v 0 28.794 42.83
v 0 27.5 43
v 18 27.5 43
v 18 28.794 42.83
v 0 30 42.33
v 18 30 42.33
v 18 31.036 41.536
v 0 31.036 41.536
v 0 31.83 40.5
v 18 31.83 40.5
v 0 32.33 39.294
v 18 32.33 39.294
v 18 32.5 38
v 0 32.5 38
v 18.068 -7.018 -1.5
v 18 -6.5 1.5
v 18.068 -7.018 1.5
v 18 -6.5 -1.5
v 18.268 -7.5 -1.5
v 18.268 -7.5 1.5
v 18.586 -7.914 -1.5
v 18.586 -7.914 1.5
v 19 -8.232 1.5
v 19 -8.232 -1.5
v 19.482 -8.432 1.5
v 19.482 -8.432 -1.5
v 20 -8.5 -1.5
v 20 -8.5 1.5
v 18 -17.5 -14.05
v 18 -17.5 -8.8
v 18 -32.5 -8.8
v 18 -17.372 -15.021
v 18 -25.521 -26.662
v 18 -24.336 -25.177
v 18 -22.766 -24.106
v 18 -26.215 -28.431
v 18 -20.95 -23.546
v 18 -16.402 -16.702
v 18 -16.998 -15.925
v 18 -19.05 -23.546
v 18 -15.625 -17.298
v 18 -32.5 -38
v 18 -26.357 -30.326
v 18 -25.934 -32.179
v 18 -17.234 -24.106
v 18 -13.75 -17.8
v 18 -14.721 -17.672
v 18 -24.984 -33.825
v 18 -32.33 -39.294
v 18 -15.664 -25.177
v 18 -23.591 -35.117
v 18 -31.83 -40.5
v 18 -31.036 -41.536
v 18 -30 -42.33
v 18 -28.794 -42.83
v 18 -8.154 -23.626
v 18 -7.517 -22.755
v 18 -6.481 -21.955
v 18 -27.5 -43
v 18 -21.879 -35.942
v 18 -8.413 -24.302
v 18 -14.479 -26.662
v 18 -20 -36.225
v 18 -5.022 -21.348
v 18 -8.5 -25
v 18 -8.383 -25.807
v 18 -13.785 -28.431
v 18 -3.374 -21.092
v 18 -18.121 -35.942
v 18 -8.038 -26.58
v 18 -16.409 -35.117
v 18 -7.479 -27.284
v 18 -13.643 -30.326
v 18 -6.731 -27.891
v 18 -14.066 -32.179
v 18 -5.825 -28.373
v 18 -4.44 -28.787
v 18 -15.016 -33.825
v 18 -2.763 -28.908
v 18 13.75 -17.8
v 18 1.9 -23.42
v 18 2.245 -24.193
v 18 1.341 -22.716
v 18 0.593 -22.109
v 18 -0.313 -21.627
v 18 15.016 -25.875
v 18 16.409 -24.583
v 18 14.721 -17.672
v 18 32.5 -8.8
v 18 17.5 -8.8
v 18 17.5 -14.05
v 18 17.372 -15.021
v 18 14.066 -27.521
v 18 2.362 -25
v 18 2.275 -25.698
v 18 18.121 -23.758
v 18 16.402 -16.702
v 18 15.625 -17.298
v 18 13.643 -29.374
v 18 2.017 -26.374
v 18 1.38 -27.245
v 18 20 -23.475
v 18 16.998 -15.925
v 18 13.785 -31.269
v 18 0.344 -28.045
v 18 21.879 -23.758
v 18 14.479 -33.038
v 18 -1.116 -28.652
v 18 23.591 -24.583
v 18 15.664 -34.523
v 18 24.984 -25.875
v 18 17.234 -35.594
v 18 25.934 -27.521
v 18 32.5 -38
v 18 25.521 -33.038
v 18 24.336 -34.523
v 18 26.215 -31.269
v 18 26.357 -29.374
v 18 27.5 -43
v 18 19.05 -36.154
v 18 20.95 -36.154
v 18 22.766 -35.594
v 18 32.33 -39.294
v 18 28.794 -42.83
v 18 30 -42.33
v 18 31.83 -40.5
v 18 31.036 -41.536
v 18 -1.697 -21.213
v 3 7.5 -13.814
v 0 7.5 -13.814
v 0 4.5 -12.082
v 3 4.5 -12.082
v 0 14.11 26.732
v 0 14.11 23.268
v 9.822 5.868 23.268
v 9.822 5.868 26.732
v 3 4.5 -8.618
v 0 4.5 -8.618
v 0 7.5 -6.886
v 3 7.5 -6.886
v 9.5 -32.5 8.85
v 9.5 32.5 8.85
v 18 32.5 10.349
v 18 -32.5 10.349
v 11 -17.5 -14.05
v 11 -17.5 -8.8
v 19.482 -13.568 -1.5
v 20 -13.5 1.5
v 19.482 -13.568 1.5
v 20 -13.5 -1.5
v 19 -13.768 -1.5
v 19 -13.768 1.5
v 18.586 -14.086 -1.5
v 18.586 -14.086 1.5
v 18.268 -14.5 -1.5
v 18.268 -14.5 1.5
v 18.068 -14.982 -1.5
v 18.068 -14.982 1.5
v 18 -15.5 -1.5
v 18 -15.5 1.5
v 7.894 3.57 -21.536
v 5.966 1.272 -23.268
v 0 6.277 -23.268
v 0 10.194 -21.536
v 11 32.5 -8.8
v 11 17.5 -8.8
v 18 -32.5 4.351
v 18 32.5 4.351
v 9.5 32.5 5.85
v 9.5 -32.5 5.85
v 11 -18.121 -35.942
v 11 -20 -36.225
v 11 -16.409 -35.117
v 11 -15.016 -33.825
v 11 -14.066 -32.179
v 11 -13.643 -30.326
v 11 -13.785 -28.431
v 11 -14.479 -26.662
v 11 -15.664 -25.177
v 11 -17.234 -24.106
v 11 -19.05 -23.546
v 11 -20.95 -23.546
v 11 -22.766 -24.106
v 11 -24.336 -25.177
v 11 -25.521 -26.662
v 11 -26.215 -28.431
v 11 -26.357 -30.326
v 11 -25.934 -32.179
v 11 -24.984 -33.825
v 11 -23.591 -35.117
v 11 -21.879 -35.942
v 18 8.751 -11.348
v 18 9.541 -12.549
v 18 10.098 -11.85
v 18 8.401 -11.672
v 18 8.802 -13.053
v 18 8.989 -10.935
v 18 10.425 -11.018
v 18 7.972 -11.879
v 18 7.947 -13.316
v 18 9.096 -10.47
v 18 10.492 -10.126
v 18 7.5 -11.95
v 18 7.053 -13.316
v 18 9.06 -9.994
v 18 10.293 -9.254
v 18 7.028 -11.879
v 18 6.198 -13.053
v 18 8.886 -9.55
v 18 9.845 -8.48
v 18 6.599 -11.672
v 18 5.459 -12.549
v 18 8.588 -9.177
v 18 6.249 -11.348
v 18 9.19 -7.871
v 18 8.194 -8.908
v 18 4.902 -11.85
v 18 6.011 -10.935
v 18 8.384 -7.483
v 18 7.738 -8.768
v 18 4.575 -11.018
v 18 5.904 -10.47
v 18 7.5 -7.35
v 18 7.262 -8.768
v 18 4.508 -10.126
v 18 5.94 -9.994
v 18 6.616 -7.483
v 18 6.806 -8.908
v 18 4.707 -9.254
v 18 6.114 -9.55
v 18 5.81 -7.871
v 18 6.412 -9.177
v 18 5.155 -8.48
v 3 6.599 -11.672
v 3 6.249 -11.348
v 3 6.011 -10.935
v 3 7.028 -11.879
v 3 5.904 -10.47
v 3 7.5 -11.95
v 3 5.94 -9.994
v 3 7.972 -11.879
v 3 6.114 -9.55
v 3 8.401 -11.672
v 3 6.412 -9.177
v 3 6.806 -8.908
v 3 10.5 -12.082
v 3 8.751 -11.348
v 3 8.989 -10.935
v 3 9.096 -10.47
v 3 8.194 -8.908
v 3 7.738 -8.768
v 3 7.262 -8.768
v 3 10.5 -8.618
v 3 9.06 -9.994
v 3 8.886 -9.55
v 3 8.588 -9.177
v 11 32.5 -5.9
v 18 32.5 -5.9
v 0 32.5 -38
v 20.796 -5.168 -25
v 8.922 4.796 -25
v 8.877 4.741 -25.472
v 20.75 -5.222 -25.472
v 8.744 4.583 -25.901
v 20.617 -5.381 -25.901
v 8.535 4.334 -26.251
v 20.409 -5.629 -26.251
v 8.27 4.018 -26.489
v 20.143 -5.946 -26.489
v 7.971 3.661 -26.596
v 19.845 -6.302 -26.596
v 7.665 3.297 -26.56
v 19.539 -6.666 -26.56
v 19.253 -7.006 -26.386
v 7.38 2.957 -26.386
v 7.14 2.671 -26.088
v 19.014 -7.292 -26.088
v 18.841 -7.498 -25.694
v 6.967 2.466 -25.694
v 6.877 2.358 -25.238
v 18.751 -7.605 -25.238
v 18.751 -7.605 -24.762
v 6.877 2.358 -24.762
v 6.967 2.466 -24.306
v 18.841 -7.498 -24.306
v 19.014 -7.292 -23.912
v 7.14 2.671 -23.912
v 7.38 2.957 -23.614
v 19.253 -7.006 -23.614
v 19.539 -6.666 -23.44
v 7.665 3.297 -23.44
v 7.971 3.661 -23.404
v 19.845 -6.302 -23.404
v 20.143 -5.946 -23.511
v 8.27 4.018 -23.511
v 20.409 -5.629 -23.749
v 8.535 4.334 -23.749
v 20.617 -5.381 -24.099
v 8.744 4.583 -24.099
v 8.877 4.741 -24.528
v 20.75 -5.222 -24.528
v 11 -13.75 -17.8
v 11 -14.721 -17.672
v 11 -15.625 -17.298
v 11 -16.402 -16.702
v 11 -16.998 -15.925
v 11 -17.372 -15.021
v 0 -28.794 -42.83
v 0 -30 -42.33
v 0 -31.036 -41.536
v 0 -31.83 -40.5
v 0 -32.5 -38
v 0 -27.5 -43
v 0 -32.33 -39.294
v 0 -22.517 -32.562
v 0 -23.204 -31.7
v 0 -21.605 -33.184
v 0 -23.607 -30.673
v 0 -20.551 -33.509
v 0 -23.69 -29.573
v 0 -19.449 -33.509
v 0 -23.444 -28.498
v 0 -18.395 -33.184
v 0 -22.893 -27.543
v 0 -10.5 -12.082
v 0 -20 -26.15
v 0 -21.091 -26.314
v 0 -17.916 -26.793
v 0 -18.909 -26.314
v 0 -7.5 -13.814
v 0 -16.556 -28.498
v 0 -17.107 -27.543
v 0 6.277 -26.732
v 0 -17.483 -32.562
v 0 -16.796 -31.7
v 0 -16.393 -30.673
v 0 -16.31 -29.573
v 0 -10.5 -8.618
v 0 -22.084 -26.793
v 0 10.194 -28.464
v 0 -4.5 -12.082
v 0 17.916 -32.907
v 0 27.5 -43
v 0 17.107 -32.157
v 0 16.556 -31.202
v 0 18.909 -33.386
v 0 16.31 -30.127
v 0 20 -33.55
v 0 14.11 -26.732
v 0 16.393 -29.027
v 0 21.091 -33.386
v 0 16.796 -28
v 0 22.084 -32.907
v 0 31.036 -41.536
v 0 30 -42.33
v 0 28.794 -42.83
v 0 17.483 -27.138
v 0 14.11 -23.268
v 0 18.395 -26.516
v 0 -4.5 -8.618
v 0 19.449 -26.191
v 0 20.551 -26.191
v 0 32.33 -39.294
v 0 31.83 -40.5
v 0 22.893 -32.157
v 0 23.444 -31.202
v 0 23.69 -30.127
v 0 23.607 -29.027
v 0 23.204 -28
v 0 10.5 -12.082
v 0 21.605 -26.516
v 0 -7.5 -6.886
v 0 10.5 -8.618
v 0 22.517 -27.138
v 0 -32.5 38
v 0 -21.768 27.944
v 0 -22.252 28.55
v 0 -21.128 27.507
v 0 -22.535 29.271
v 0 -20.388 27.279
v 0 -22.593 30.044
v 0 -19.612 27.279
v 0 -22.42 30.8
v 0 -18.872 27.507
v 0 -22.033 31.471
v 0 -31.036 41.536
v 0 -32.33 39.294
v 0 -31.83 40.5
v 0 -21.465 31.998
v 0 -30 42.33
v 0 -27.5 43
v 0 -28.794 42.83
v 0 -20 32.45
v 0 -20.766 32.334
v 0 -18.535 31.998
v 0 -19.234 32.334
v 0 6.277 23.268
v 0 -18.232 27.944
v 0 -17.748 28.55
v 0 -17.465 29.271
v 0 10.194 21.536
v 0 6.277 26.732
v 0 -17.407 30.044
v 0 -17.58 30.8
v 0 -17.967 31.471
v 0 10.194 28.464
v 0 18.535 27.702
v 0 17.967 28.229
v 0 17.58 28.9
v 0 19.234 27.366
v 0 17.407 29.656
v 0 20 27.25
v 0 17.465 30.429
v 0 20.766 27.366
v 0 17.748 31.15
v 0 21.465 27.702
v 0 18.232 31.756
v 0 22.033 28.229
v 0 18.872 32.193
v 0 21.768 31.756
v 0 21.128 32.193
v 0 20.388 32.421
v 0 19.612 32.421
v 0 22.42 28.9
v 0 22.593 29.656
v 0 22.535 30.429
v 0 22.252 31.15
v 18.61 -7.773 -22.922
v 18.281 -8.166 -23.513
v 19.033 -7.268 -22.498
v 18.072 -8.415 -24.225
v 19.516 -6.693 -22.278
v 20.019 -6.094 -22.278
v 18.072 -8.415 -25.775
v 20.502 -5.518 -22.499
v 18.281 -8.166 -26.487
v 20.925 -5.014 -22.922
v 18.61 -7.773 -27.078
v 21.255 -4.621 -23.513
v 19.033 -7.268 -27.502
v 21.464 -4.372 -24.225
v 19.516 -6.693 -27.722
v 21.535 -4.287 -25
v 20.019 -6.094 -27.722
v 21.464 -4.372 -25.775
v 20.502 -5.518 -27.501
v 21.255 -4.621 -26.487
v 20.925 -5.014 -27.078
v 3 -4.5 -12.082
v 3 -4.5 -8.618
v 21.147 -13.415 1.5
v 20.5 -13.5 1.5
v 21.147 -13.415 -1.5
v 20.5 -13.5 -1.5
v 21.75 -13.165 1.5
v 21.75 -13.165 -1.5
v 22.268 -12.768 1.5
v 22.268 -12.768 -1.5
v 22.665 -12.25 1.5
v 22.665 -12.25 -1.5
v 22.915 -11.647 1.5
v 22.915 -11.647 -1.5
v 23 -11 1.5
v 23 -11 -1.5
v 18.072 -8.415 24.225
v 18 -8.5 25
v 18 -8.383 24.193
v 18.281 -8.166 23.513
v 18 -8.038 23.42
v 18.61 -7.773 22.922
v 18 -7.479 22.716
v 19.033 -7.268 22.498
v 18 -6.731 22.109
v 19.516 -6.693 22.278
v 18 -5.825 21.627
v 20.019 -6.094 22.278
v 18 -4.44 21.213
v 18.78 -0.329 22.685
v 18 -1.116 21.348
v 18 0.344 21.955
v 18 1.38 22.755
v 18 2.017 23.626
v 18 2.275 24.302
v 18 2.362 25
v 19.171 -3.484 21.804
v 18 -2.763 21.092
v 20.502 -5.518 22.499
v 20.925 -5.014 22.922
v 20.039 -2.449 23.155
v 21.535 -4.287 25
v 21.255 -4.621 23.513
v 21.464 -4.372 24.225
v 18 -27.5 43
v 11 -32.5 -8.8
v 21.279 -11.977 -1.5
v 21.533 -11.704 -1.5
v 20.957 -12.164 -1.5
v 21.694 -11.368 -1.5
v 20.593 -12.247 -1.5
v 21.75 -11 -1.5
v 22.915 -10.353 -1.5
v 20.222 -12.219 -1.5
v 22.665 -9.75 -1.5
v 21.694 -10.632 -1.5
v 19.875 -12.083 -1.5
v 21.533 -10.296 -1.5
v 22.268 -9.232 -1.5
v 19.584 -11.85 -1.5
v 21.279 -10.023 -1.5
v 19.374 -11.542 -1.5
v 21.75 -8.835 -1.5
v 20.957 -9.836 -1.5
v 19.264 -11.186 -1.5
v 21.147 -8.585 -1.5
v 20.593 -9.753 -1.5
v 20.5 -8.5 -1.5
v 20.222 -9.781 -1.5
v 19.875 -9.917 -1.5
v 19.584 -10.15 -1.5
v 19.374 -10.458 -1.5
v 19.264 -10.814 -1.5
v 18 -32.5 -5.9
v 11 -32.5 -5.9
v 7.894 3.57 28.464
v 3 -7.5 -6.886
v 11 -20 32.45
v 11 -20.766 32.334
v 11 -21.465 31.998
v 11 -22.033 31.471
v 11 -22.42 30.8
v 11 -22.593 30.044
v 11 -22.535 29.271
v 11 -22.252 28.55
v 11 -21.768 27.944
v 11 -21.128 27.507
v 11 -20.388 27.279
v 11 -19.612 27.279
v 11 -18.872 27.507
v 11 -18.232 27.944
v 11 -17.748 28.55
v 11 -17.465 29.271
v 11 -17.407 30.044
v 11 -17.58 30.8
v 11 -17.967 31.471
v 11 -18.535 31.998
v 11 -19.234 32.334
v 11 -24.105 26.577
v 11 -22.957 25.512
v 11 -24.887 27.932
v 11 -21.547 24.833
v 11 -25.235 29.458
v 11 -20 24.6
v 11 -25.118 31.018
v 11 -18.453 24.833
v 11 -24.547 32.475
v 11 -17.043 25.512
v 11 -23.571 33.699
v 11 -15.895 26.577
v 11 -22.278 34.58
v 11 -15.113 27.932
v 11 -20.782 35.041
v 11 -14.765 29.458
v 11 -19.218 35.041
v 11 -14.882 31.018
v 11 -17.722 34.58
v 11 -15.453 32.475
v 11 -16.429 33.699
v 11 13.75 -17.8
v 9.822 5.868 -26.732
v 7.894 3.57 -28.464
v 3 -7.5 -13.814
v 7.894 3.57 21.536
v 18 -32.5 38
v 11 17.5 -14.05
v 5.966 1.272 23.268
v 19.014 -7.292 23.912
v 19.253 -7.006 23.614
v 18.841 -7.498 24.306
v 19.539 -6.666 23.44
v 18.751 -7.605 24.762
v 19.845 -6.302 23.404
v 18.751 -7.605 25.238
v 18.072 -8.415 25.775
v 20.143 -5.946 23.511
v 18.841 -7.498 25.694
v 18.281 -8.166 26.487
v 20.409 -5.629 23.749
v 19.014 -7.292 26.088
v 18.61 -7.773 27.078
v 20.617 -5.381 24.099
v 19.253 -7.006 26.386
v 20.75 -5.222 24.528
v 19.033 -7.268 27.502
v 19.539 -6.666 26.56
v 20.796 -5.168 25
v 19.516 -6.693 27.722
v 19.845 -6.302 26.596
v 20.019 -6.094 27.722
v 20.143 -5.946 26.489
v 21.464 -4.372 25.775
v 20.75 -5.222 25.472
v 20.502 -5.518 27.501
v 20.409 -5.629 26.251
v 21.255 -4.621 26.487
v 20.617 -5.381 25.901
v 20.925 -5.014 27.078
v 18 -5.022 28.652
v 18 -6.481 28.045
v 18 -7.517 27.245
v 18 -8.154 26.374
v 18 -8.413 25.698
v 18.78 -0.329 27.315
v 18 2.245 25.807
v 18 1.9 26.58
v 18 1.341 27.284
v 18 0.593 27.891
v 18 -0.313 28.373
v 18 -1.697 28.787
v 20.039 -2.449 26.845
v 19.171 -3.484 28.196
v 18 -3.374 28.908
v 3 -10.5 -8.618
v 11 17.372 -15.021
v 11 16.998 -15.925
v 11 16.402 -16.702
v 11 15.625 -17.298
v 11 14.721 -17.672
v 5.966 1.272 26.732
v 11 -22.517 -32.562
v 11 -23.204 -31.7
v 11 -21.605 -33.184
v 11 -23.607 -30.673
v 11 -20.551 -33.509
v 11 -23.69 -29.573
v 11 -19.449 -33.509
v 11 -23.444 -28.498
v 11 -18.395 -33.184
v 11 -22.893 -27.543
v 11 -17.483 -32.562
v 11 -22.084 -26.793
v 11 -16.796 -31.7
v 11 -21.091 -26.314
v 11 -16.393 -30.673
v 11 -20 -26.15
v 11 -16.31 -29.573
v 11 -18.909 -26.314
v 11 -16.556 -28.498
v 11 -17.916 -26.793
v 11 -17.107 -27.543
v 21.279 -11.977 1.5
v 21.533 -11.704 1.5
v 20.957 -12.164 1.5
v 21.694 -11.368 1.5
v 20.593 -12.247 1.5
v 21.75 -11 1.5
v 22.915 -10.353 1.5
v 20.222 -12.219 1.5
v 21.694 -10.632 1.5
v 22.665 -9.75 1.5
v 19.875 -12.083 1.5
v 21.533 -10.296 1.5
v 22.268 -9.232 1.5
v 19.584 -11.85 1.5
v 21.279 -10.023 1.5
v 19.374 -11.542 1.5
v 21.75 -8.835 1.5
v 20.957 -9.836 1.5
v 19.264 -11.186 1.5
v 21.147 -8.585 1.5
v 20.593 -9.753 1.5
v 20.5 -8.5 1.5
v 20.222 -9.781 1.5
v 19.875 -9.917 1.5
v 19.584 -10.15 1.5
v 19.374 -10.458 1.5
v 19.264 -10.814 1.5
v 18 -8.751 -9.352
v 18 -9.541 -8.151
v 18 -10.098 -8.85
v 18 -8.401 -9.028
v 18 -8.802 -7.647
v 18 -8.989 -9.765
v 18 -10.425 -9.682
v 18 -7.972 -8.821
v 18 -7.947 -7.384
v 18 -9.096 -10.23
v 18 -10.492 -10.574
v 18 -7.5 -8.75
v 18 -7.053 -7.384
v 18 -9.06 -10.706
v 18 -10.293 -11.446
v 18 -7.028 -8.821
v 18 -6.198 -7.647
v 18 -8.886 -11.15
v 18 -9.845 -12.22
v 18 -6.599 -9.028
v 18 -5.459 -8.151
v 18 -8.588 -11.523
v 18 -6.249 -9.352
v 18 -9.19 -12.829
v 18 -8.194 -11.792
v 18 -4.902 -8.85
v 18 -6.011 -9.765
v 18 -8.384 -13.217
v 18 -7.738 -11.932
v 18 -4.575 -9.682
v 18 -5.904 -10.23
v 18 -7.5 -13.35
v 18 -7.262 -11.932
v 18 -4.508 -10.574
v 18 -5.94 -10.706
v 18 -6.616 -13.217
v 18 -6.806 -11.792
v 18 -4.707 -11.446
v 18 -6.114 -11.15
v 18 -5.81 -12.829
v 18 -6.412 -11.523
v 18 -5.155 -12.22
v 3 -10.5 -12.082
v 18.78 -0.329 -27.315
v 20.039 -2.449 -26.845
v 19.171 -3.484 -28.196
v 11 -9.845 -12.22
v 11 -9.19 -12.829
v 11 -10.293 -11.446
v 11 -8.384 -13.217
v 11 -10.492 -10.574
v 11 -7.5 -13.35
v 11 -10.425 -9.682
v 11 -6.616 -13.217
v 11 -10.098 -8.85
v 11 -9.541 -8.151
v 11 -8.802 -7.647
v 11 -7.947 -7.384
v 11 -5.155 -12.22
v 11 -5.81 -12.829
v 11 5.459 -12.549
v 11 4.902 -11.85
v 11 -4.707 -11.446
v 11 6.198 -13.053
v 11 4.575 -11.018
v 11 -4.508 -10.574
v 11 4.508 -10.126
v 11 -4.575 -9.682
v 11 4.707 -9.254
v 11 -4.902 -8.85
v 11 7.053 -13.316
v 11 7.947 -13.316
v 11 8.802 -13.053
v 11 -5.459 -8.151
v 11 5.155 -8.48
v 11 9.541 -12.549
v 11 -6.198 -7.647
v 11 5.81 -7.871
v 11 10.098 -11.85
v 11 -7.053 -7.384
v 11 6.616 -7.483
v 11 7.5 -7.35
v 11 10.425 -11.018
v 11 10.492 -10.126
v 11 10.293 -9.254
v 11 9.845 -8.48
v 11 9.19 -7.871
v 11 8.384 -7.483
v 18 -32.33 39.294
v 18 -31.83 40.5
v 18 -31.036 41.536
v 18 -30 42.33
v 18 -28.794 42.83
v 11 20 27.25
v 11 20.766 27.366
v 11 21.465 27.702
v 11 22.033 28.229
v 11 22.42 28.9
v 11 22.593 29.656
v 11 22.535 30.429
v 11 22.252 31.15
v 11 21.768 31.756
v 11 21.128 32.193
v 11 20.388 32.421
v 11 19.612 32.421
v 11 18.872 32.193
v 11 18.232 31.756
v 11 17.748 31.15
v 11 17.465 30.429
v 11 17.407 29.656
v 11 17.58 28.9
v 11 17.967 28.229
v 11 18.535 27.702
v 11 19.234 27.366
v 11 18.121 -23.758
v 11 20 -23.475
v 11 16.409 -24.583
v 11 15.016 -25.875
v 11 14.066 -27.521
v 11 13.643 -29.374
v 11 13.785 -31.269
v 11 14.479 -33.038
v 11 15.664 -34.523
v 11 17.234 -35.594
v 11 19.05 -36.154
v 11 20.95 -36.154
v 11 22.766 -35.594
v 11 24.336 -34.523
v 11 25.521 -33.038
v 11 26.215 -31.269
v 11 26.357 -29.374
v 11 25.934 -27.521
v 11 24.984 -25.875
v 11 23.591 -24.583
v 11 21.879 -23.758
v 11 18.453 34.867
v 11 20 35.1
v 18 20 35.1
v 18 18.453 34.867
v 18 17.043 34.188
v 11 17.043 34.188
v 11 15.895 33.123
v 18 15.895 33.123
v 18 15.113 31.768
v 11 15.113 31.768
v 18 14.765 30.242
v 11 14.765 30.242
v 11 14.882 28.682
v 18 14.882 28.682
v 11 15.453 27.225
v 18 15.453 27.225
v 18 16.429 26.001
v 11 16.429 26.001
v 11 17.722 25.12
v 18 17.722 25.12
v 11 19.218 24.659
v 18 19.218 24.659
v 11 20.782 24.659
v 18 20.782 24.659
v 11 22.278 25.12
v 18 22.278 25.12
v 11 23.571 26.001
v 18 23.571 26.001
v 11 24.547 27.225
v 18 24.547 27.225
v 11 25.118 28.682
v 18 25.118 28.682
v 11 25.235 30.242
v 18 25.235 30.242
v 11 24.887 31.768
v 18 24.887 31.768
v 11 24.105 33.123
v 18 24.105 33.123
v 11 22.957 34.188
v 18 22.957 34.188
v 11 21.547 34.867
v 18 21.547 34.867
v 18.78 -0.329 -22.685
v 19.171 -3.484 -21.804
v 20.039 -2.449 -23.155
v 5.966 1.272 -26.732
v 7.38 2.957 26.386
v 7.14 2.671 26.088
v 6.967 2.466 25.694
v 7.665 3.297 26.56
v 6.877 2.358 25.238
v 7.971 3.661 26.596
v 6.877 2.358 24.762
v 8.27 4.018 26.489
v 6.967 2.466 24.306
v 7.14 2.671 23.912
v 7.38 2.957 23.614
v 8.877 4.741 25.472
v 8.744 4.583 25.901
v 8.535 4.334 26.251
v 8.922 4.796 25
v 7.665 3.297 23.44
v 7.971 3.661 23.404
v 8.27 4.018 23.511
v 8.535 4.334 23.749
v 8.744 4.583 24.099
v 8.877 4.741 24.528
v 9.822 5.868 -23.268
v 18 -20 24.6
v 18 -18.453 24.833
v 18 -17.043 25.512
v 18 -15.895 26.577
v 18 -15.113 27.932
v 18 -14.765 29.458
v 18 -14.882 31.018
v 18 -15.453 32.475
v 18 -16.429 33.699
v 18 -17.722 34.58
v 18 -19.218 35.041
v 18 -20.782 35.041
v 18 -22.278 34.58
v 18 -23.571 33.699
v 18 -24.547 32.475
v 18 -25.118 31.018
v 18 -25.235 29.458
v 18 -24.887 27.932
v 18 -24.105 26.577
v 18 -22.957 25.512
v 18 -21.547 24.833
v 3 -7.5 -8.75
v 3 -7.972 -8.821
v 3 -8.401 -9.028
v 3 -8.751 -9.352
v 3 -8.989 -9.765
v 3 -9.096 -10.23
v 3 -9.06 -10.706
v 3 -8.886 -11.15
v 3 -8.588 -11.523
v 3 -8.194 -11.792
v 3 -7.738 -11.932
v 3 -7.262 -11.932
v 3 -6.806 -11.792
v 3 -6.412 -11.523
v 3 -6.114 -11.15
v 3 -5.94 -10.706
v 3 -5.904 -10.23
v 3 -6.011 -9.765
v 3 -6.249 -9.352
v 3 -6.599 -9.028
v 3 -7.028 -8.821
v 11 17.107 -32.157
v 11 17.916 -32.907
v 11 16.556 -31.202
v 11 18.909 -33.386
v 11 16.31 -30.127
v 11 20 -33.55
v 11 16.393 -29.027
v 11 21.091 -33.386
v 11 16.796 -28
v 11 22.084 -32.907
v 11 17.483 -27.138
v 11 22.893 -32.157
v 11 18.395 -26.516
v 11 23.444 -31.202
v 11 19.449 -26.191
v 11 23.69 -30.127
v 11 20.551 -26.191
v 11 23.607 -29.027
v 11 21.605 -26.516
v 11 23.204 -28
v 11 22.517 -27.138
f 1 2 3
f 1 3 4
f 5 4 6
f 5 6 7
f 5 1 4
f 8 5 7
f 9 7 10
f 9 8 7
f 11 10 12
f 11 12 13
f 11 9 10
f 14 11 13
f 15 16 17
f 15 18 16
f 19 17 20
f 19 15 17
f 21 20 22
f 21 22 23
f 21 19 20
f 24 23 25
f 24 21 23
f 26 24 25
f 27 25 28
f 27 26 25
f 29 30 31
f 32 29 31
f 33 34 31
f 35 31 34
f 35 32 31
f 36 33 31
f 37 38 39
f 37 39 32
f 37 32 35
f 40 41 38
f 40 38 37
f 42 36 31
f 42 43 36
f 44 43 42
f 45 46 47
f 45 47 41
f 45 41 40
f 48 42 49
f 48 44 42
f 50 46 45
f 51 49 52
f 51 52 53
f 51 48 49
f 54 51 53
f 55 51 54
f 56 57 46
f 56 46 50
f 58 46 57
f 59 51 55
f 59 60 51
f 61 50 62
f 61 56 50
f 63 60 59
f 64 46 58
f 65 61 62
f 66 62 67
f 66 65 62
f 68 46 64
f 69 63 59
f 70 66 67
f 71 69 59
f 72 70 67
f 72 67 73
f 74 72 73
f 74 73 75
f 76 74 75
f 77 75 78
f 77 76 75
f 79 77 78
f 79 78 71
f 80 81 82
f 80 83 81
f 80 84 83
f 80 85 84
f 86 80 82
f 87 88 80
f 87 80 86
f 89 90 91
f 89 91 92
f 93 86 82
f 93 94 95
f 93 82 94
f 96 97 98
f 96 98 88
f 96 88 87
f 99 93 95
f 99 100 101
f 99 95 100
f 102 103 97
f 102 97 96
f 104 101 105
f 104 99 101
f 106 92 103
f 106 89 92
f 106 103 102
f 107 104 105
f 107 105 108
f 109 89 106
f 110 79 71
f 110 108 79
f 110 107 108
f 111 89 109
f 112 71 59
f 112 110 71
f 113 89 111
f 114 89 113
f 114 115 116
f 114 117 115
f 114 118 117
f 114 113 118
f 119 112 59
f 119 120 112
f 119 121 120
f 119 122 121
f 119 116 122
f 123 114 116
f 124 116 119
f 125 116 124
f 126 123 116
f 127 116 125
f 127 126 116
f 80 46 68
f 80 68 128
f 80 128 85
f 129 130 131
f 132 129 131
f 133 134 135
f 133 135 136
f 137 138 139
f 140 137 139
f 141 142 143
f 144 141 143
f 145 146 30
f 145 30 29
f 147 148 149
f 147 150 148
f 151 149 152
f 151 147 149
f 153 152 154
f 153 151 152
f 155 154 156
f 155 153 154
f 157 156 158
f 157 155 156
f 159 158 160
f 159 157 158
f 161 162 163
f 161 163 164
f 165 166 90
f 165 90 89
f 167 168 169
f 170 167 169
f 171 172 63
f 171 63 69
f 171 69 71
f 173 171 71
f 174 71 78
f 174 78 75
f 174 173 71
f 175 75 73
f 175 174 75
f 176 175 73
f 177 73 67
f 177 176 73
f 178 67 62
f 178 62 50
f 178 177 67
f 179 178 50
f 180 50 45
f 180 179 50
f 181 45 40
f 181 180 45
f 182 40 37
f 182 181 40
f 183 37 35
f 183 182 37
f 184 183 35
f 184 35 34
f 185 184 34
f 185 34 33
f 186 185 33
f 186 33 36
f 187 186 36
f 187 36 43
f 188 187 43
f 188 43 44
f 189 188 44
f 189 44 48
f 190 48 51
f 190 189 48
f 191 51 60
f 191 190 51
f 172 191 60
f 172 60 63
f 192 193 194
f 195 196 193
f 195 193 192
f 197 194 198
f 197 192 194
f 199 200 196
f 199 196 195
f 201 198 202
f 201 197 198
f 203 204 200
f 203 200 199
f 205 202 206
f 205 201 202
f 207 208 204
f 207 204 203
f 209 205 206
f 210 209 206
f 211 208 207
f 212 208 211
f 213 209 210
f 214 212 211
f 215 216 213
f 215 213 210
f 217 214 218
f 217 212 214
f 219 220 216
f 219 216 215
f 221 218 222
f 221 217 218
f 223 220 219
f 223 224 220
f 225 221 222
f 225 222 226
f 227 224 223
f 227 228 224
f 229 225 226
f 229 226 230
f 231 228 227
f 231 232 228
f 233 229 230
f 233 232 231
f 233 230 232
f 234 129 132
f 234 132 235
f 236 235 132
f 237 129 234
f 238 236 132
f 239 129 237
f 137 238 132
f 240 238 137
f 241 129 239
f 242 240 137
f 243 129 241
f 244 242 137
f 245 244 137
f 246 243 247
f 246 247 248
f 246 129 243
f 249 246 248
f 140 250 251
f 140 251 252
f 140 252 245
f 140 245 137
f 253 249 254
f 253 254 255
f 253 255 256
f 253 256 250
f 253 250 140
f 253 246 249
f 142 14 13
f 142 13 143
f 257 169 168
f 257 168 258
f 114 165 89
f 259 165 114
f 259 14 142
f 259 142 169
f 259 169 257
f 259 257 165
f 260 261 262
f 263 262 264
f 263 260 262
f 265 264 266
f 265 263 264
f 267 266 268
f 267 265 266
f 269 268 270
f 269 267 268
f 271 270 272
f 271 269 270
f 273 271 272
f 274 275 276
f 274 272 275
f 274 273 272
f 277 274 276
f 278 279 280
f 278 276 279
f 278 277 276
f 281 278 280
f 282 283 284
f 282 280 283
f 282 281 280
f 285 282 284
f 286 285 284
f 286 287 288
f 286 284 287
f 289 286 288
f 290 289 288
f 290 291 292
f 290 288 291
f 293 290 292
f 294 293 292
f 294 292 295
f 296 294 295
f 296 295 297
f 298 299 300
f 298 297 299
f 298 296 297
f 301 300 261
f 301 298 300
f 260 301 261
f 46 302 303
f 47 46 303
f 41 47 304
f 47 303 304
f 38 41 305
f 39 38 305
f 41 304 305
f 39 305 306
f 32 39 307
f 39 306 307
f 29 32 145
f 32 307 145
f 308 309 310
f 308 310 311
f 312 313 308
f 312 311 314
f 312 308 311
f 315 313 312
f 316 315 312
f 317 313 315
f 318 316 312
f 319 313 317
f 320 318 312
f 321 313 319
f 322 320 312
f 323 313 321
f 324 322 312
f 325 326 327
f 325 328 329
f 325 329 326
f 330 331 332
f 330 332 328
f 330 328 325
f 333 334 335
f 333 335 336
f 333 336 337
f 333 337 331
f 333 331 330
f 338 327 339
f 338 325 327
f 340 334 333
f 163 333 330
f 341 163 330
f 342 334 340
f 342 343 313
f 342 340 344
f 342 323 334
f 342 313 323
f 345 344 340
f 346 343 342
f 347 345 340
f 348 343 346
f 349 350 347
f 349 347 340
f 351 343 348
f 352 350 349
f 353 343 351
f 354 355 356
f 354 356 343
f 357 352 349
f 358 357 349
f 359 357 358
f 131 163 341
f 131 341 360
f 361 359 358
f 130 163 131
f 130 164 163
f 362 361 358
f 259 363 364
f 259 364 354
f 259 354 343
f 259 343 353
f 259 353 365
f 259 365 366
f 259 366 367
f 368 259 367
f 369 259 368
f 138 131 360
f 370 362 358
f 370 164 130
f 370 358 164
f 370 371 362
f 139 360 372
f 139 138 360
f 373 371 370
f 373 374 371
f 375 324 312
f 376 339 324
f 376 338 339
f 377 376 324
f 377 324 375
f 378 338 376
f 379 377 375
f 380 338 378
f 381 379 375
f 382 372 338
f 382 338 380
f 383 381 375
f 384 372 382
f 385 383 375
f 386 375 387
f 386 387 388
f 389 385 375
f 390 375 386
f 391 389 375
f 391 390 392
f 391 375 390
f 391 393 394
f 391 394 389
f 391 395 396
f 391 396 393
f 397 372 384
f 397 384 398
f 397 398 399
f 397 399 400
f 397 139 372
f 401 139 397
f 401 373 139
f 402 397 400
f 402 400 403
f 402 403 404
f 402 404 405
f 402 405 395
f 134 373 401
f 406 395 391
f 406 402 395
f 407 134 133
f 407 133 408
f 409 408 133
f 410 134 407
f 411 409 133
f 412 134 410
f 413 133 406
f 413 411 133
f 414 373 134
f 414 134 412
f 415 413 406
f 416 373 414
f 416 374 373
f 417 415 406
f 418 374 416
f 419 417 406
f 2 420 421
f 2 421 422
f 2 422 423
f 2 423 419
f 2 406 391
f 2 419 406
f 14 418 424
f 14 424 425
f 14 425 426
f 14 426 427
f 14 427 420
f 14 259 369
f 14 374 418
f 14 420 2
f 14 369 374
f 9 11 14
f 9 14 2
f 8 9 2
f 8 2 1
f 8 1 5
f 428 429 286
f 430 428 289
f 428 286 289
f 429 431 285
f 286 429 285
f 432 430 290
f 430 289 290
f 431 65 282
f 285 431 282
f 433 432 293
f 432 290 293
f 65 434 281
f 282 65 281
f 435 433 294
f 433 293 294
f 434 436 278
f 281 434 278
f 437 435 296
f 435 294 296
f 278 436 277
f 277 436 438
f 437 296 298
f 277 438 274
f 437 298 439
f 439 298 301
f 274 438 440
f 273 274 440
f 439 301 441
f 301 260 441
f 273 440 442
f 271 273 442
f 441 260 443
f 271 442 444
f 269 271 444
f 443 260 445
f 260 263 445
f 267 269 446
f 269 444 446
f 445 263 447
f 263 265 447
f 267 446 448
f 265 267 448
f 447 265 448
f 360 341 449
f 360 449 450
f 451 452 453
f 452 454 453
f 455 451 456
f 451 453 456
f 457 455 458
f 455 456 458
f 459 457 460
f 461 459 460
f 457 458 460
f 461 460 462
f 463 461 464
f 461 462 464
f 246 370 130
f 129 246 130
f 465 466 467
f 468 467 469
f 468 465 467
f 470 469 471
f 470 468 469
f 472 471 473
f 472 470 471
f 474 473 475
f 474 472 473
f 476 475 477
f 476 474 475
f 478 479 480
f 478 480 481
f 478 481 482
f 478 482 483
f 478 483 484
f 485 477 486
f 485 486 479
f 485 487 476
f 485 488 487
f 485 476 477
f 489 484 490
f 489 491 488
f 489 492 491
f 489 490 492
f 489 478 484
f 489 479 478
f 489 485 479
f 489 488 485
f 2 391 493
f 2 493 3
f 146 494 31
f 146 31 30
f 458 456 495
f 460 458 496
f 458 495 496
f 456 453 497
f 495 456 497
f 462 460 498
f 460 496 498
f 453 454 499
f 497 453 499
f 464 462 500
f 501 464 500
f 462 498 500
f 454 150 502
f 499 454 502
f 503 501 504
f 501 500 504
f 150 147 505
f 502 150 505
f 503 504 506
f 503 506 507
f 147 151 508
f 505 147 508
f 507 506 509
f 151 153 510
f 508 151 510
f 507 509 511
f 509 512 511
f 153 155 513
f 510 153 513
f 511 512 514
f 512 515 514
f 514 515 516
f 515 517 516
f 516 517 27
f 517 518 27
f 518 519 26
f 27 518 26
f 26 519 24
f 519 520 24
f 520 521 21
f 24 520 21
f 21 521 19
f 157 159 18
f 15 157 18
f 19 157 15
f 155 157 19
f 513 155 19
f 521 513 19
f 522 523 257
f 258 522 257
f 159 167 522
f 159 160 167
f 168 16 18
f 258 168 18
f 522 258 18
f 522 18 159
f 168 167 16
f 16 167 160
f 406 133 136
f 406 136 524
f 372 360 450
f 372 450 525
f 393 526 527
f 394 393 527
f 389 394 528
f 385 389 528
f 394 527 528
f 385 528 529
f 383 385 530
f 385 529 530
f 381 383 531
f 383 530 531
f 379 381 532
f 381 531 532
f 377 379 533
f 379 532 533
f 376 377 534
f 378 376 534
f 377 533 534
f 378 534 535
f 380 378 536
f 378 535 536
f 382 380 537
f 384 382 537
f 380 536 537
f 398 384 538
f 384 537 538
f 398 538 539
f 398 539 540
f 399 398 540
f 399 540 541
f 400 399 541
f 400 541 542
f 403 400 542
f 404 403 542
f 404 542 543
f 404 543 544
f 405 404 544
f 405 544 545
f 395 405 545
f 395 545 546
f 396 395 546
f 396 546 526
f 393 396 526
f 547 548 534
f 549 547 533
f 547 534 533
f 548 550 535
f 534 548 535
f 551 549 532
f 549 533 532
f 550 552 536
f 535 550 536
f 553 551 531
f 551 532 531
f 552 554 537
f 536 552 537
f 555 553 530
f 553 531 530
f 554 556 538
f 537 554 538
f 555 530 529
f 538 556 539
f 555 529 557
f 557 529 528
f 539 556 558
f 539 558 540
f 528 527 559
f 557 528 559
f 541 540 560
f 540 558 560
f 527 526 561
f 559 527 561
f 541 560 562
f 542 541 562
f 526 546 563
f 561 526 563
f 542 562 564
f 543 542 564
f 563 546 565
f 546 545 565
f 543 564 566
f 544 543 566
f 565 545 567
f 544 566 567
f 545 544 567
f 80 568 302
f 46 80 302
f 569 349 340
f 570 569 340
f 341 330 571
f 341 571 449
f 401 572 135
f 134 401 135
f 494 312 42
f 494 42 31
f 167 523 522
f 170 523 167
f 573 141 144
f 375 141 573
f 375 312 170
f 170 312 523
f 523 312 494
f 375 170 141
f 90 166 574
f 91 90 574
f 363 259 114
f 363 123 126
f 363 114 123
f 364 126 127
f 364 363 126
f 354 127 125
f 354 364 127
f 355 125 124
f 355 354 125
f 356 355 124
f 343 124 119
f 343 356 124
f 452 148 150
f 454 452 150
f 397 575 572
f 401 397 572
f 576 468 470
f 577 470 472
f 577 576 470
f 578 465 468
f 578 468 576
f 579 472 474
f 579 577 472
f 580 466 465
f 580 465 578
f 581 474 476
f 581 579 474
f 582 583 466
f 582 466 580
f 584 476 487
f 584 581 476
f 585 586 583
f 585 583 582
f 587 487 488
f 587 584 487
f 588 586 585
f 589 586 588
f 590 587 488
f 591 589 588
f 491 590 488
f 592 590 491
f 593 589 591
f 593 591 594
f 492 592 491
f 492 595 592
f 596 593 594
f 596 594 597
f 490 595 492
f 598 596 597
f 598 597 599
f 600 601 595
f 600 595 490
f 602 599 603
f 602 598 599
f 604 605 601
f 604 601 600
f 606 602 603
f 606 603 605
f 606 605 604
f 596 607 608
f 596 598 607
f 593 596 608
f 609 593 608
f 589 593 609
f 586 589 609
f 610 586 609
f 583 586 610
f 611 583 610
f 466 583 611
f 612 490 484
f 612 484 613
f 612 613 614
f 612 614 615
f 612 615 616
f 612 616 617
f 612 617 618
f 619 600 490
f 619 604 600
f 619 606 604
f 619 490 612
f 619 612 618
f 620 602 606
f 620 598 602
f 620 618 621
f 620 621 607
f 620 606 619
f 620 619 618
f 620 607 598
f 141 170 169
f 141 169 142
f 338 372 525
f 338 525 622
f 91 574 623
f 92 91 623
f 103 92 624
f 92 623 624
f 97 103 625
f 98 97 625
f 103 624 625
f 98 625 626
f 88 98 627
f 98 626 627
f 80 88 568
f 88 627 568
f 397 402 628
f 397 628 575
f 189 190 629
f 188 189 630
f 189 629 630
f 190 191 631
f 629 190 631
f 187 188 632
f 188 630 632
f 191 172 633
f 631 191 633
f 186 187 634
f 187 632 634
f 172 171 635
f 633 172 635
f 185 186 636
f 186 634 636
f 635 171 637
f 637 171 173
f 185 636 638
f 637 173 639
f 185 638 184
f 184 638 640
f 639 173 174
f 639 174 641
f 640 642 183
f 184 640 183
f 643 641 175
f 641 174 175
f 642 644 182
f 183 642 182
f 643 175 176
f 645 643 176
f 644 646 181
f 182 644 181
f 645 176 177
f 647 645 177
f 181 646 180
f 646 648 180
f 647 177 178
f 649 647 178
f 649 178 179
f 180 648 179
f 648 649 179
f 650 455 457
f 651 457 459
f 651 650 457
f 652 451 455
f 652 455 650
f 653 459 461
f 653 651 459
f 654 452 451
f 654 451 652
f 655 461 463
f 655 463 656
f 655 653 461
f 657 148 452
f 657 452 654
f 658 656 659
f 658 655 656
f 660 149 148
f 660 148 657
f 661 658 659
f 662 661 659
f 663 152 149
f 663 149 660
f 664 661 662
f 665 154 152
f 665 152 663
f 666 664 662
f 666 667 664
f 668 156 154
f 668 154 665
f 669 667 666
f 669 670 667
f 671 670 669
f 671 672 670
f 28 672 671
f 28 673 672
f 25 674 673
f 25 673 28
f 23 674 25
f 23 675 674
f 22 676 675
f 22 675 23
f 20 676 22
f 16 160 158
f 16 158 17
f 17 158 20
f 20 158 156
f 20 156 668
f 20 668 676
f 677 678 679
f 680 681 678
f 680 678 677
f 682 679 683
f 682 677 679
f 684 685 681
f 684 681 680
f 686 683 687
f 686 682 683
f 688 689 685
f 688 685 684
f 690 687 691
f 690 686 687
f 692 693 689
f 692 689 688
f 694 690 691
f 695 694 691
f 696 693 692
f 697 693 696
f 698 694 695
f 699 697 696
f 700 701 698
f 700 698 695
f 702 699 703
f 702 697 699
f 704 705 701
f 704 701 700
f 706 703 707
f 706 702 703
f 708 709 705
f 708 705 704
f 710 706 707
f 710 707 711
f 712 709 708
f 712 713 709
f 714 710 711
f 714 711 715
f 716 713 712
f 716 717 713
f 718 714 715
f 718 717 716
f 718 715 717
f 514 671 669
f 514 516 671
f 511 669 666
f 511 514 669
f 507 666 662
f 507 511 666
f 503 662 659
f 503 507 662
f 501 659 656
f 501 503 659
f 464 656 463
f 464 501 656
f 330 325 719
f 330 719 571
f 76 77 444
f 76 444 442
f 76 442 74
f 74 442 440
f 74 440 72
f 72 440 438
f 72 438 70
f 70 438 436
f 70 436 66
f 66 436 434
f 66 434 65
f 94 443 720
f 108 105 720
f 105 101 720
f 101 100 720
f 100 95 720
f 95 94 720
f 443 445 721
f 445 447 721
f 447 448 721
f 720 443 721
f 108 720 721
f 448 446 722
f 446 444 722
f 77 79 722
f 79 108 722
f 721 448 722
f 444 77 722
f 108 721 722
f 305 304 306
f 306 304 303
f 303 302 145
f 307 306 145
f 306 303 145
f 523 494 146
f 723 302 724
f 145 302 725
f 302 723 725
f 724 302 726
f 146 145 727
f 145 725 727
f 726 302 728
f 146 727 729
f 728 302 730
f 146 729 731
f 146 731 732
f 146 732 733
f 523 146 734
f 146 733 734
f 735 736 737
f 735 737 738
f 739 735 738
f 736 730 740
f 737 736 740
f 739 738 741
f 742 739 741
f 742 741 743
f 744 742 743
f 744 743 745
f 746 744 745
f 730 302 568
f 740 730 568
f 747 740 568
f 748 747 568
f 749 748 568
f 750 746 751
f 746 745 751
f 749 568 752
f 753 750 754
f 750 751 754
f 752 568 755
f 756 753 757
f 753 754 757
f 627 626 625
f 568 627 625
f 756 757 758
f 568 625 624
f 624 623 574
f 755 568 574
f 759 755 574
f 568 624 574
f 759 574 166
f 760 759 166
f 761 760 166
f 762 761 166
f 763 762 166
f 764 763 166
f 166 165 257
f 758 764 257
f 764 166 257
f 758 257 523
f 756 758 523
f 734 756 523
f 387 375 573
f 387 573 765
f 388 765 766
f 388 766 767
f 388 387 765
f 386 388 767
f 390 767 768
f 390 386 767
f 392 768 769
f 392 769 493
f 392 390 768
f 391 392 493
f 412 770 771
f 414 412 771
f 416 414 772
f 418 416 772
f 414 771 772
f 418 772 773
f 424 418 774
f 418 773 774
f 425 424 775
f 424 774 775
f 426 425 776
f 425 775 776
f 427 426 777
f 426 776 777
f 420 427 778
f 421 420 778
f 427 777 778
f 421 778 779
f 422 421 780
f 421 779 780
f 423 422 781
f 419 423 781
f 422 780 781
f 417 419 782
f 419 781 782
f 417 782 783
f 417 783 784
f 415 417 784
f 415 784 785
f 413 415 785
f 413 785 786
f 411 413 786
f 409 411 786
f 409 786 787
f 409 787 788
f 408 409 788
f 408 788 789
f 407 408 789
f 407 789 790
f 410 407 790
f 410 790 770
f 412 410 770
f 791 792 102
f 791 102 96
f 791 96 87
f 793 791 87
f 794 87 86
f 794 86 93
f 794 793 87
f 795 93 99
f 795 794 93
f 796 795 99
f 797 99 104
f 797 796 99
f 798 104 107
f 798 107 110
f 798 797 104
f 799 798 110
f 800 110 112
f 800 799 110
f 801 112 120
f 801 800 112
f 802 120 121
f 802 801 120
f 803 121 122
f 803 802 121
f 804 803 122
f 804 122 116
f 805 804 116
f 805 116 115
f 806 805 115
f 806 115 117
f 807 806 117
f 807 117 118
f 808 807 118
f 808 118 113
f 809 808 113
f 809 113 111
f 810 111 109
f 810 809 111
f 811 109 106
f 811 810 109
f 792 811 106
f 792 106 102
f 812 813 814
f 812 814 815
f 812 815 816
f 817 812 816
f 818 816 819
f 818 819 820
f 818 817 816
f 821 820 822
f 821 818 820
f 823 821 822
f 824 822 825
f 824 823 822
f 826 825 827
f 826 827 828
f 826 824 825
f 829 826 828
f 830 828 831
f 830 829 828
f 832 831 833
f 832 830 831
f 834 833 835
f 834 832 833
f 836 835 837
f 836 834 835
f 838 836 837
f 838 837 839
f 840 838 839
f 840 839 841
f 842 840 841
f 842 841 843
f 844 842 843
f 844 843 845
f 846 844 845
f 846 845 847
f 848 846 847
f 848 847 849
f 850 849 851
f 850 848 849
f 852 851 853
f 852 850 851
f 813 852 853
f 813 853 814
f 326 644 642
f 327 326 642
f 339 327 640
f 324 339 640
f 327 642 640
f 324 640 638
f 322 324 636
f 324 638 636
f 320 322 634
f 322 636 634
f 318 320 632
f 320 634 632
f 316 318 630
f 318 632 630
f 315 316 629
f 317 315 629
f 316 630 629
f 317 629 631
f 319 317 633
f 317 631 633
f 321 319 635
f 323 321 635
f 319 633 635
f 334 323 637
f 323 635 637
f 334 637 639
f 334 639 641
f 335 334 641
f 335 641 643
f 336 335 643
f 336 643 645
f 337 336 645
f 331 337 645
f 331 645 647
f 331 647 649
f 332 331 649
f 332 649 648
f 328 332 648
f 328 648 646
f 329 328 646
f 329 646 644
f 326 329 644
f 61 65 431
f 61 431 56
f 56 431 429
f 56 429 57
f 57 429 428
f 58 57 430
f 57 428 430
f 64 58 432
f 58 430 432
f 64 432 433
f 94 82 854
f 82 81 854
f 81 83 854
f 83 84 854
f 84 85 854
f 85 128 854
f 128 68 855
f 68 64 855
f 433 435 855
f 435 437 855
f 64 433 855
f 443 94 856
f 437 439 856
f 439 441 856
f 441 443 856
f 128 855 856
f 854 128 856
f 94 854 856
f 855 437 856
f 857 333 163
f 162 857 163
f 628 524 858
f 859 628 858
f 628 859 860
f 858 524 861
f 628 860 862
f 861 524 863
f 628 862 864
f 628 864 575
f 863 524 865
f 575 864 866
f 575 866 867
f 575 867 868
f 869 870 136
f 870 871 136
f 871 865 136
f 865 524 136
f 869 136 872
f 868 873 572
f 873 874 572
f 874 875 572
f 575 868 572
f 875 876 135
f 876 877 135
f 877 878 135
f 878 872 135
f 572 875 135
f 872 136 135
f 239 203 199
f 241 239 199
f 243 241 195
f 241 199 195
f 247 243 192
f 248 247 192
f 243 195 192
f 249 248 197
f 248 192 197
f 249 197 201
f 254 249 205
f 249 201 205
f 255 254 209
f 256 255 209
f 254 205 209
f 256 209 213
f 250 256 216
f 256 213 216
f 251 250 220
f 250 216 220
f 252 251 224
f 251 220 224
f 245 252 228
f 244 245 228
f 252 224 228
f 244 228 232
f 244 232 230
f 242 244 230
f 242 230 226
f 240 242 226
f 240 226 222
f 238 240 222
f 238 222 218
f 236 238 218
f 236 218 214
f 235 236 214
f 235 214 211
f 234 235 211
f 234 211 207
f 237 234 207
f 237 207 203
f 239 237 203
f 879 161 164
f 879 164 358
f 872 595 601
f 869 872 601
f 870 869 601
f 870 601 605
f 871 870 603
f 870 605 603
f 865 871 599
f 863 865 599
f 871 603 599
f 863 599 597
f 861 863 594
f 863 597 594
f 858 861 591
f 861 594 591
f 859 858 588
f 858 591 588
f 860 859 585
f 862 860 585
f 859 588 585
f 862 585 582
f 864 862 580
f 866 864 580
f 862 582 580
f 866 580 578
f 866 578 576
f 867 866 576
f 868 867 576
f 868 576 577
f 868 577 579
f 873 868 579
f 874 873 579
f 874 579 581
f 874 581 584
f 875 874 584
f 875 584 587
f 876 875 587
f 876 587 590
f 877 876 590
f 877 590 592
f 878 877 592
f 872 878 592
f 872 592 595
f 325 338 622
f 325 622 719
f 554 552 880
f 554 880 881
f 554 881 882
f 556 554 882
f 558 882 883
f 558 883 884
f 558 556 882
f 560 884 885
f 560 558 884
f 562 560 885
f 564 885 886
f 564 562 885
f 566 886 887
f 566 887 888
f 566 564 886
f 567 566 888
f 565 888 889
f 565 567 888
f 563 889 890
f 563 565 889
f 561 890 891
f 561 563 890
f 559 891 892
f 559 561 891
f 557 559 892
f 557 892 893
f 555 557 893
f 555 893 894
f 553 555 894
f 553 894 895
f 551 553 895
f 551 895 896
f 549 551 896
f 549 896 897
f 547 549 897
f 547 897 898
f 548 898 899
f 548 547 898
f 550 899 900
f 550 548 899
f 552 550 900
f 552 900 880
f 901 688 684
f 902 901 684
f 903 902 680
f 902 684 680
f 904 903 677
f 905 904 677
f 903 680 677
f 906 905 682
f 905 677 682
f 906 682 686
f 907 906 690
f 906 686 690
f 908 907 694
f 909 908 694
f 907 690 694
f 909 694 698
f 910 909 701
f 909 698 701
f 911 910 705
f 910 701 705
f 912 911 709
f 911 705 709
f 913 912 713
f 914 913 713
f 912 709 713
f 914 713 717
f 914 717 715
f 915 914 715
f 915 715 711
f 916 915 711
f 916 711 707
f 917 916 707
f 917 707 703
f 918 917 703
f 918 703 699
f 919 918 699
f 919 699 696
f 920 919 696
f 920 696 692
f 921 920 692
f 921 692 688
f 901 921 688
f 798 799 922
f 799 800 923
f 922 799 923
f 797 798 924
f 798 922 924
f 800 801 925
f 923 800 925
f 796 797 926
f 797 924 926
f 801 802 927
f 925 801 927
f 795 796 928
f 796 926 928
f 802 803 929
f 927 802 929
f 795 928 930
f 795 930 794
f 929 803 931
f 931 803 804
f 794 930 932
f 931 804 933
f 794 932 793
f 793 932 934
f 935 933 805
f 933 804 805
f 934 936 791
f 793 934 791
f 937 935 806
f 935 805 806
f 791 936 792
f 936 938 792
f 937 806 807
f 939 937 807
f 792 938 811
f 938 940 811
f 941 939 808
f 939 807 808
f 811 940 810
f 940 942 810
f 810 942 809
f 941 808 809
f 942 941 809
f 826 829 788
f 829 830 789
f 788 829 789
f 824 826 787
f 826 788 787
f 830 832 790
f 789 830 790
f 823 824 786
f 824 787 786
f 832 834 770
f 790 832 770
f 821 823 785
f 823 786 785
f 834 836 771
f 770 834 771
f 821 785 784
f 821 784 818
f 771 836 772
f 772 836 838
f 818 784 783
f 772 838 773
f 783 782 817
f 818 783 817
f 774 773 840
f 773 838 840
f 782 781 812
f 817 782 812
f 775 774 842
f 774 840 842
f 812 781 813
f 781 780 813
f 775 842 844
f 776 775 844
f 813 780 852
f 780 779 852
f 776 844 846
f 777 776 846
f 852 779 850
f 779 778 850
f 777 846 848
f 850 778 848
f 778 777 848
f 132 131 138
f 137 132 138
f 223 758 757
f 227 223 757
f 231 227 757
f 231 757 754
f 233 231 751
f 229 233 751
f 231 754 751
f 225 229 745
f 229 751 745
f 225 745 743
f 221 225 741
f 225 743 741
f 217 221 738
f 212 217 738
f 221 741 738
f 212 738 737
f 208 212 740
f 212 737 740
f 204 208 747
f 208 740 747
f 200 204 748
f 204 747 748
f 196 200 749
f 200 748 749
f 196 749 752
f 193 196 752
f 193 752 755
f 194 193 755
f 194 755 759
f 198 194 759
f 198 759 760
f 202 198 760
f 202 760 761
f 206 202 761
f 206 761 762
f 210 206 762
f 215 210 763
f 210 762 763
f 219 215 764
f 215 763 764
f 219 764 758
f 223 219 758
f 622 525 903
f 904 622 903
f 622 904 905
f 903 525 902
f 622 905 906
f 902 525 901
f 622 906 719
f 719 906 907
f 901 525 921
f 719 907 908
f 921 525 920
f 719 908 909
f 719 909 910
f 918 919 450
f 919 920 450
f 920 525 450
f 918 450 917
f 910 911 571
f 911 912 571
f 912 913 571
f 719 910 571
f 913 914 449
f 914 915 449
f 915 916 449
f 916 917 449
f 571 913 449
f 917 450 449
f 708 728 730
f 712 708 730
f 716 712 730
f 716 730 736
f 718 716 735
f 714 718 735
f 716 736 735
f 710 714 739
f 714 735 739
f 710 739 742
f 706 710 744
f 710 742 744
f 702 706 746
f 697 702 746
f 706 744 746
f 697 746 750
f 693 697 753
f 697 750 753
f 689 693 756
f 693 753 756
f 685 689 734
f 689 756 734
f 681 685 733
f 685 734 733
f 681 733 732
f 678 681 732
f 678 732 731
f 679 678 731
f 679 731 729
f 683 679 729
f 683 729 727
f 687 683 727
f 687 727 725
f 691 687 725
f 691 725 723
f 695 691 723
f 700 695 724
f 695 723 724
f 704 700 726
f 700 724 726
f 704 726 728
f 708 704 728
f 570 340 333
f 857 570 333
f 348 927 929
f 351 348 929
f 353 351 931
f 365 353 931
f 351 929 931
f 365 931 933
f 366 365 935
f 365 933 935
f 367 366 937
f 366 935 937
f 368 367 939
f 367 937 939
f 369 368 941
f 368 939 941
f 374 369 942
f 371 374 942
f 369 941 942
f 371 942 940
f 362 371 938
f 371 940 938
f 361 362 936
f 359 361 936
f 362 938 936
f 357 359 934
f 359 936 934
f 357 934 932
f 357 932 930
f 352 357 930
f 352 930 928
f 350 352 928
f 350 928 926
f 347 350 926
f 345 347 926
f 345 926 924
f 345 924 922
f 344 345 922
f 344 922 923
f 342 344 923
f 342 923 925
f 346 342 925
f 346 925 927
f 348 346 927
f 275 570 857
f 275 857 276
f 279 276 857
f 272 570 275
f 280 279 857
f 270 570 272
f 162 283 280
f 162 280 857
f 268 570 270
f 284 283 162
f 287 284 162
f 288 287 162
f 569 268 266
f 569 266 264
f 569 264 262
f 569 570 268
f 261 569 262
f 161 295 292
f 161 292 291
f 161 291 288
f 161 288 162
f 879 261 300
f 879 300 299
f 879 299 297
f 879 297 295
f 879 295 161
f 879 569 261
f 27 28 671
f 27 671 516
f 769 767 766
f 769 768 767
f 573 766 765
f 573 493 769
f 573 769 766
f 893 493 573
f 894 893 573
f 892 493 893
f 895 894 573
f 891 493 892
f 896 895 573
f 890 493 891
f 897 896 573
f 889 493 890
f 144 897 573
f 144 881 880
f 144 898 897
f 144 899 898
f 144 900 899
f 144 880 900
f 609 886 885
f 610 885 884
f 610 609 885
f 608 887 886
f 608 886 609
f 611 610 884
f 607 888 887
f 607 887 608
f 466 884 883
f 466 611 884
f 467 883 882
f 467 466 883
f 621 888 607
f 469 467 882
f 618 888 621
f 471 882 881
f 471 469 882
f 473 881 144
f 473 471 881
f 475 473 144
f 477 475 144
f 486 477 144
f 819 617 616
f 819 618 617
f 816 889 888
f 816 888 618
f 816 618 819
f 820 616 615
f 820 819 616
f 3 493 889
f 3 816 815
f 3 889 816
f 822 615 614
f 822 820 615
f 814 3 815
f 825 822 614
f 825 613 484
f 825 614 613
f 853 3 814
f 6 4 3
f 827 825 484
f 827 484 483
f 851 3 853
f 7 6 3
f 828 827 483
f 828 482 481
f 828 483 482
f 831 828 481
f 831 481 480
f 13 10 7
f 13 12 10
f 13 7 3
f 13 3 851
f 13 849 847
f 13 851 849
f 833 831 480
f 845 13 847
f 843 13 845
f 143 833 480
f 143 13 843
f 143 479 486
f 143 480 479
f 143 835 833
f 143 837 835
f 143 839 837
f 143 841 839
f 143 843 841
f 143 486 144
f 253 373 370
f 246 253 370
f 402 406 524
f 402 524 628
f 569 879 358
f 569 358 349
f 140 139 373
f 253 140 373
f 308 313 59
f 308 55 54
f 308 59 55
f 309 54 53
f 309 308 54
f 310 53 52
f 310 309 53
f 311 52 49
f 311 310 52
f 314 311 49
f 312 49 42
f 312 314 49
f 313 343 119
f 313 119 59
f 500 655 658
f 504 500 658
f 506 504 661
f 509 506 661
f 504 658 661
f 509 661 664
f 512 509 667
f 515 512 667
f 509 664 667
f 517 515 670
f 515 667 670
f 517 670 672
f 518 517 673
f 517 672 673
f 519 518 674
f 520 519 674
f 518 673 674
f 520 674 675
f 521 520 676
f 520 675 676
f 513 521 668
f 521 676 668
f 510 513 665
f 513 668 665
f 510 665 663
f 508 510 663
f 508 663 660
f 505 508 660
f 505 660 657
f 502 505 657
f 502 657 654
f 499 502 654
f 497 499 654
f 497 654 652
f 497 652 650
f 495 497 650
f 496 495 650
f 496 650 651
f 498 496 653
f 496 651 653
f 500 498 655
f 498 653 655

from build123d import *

# Parameters (mm, degrees)
BOSS_EXTRUDE1_DEPTH = 11
CLEAR_HOLE_BOLT_R   = 3.7
CLEAR_HOLE_BOLT_R_2 = 2.6
CUT_EXTRUDE1_DEPTH  = 56.011362463
SKETCH5_R           = 3
SKETCH5_W           = 5
SKETCH5_H           = 15
BOSS_EXTRUDE2_DEPTH = 7
M3_SUPPORT_HOLES_R  = 1.6
CUT_EXTRUDE2_DEPTH  = 57.826490302
CUT_EXTRUDE4_DEPTH  = 3
SKETCH7_R           = 5.25
SKETCH7_R_2         = 6.375
BOSS_EXTRUDE3_DEPTH = 7
CUT_EXTRUDE5_START  = -32.5
CUT_EXTRUDE5_DEPTH  = 65
SKETCH24_R          = 1.6
CUT_EXTRUDE7_DEPTH  = 64.877232071
CUT_EXTRUDE8_START  = -15.5
CUT_EXTRUDE8_DEPTH  = 20
SKETCH26_W          = 3
SKETCH26_H          = 5
BOSS_EXTRUDE7_DEPTH = 5
SKETCH27_R          = 1.25
CUT_EXTRUDE9_DEPTH  = 3
FILLET1_R           = 2.5
FILLET2_R           = 2


# Read off the part's stored shape, not the designer's step: Cut-Extrude5, Boss-Extrude6
with BuildPart() as part:
    # Main Body → Boss-Extrude1 (new body)
    with BuildSketch(Plane(origin=(0, 0, 0), x_dir=(0, 0, -1), z_dir=(1, 0, 0))):
        with BuildLine():
            Line((-38, 32.5), (38, 32.5))
            ThreePointArc((38, 32.5), (41.535533906, 31.035533906), (43, 27.5))
            Line((43, 27.5), (43, -27.5))
            ThreePointArc((43, -27.5), (41.535533906, -31.035533906), (38, -32.5))
            Line((38, -32.5), (-38, -32.5))
            ThreePointArc((-38, -32.5), (-41.535533906, -31.035533906), (-43, -27.5))
            Line((-43, -27.5), (-43, 27.5))
            ThreePointArc((-43, 27.5), (-41.535533906, 31.035533906), (-38, 32.5))
        make_face()
    extrude(amount=BOSS_EXTRUDE1_DEPTH)

    # Clear Hole-Bolt → Cut-Extrude1 (cut, through all)
    with BuildSketch(Plane(origin=(11, 0, 0), x_dir=(0, 0, -1), z_dir=(1, 0, 0))):
        with Locations((29.85, 20)):
            Circle(CLEAR_HOLE_BOLT_R)
        with Locations((-29.85, 20)):
            Circle(CLEAR_HOLE_BOLT_R_2)
        with Locations(Location((-29.85, -20, 0), (0, 0, 180))):
            Circle(CLEAR_HOLE_BOLT_R_2)
        with Locations(Location((29.85, -20, 0), (0, 0, 180))):
            Circle(CLEAR_HOLE_BOLT_R)
    extrude(amount=-CUT_EXTRUDE1_DEPTH, mode=Mode.SUBTRACT)

    # Sketch5 → Boss-Extrude2 (add)
    with BuildSketch(Plane(origin=(11, 0, 0), x_dir=(0, 0, -1), z_dir=(1, 0, 0))):
        with Locations((10.35, -7.5)):
            Circle(SKETCH5_R)
        with Locations(Location((10.35, 7.5, 0), (0, 0, 180))):
            Circle(SKETCH5_R)
        with Locations((11.3, -25)):
            Rectangle(SKETCH5_W, SKETCH5_H)
        with Locations((3.4, -25)):
            Rectangle(SKETCH5_W, SKETCH5_H)
        with Locations((11.3, 25)):
            Rectangle(SKETCH5_W, SKETCH5_H)
        with Locations((3.4, 25)):
            Rectangle(SKETCH5_W, SKETCH5_H)
    extrude(amount=BOSS_EXTRUDE2_DEPTH)

    # M3 Support Holes → Cut-Extrude2 (cut, through all)
    with BuildSketch(Plane(origin=(18, 0, 0), x_dir=(0, 0, -1), z_dir=(1, 0, 0))):
        with Locations((10.35, 7.5)):
            Circle(M3_SUPPORT_HOLES_R)
        with Locations(Location((10.35, -7.5, 0), (0, 0, 180))):
            Circle(M3_SUPPORT_HOLES_R)
    extrude(amount=-CUT_EXTRUDE2_DEPTH, mode=Mode.SUBTRACT)

    # M3 Nut Support → Cut-Extrude4 (cut)
    with BuildSketch(Plane.ZY):
        Polygon((-8.617949192, 10.5), (-12.082050808, 10.5), (-13.814101615, 7.5), (-12.082050808, 4.5), (-8.617949192, 4.5), (-6.885898385, 7.5), align=None)
        Polygon((-6.885898385, -7.5), (-8.617949192, -10.5), (-12.082050808, -10.5), (-13.814101615, -7.5), (-12.082050808, -4.5), (-8.617949192, -4.5), align=None)
    extrude(amount=-CUT_EXTRUDE4_DEPTH, mode=Mode.SUBTRACT)

    # Sketch7 → Boss-Extrude3 (add)
    # profile 1 of 2: a face of its own
    with BuildSketch(Plane(origin=(11, 0, 0), x_dir=(0, 0, -1), z_dir=(1, 0, 0))):
        with BuildLine():
            Line((5.9, 32.5), (5.9, -32.5))
            Line((5.9, -32.5), (-38, -32.5))
            ThreePointArc((-38, -32.5), (-41.535533906, -31.035533906), (-43, -27.5))
            Line((-43, -27.5), (-43, 27.5))
            ThreePointArc((-43, 27.5), (-41.535533906, 31.035533906), (-38, 32.5))
            Line((-38, 32.5), (5.9, 32.5))
        make_face()
        with Locations((-29.85, -20)):
            Circle(SKETCH7_R, mode=Mode.SUBTRACT)
        with Locations(Location((-29.85, 20, 0), (0, 0, 180))):
            Circle(SKETCH7_R, mode=Mode.SUBTRACT)
    # profile 2 of 2: a face of its own
    with BuildSketch(Plane(origin=(11, 0, 0), x_dir=(0, 0, -1), z_dir=(1, 0, 0))):
        with BuildLine():
            Line((13.8, 32.5), (13.8, 17.5))
            Line((13.8, 17.5), (14.05, 17.5))
            ThreePointArc((14.05, 17.5), (16.701650429, 16.401650429), (17.8, 13.75))
            Line((17.8, 13.75), (17.8, -13.75))
            ThreePointArc((17.8, -13.75), (16.701650429, -16.401650429), (14.05, -17.5))
            Line((14.05, -17.5), (13.8, -17.5))
            Line((13.8, -17.5), (13.8, -32.5))
            Line((13.8, -32.5), (38, -32.5))
            ThreePointArc((38, -32.5), (41.535533906, -31.035533906), (43, -27.5))
            Line((43, -27.5), (43, 27.5))
            ThreePointArc((43, 27.5), (41.535533906, 31.035533906), (38, 32.5))
            Line((38, 32.5), (13.8, 32.5))
        make_face()
        with Locations((29.85, -20)):
            Circle(SKETCH7_R_2, mode=Mode.SUBTRACT)
        with Locations(Location((29.85, 20, 0), (0, 0, 180))):
            Circle(SKETCH7_R_2, mode=Mode.SUBTRACT)
    extrude(amount=BOSS_EXTRUDE3_DEPTH)

    # Cut-Extrude5 outline → Cut-Extrude5 (cut)
    with BuildSketch(Plane(origin=(0, 0, 0), x_dir=(1, 0, 0), z_dir=(0, 1, 0)).offset(CUT_EXTRUDE5_START)):
        Polygon((18, -10.348779336), (18, -4.351220664), (9.5, -5.85), (9.5, -8.85), align=None)
    extrude(amount=CUT_EXTRUDE5_DEPTH, mode=Mode.SUBTRACT)

    # Boss-Extrude6 outline → Boss-Extrude6 (revolve)
    with BuildSketch(Plane(origin=(5.019399377, 5.981887241, 25), x_dir=(0.6427876096865357, 0.7660444431189811, 0), z_dir=(0, 0, -1))):
        Polygon((5.590261427, 12.222600941), (2.75, 19.252494658), (0, 19.252494658), (0, 12.222600941), align=None)
    boss_extrude6 = revolve(axis=Axis((5.019399377, 5.981887241, 25), (0.7660444431189813, -0.6427876096865358, 0)))

    # Sketch24 → Cut-Extrude7 (cut, through all)
    with BuildSketch(Plane(origin=(14.748266549, -12.375265022, 0), x_dir=(0, 0, -1), z_dir=(0.7660444431189812, -0.6427876096865357, 0))):
        with Locations(Location((-25, 7.808799208, 0), (0, 0, 90))):
            Circle(SKETCH24_R)
    cut_extrude7 = extrude(amount=-CUT_EXTRUDE7_DEPTH, mode=Mode.SUBTRACT)

    # Sketch25 → Cut-Extrude8 (cut)
    with BuildSketch(Plane(origin=(14.748266549, -12.375265022, 0), x_dir=(0, 0, -1), z_dir=(0.7660444431189812, -0.6427876096865356, 0)).offset(CUT_EXTRUDE8_START)):
        Polygon((-23.267949192, 10.808799208), (-26.732050808, 10.808799208), (-28.464101615, 7.808799208), (-26.732050808, 4.808799208), (-23.267949192, 4.808799208), (-21.535898385, 7.808799208), align=None)
    cut_extrude8 = extrude(amount=-CUT_EXTRUDE8_DEPTH, mode=Mode.SUBTRACT)

    # Mirror2: Boss-Extrude6, Cut-Extrude7, Cut-Extrude8 across plane
    add(boss_extrude6.mirror(Plane.XY))
    add(cut_extrude7.mirror(Plane.XY), mode=Mode.SUBTRACT)
    add(cut_extrude8.mirror(Plane.XY), mode=Mode.SUBTRACT)

    # Sketch26 → Boss-Extrude7 (add)
    with BuildSketch(Plane(origin=(18, 0, 0), x_dir=(0, 0, -1), z_dir=(1, 0, 0))):
        with Locations((0, -11)):
            Rectangle(SKETCH26_W, SKETCH26_H)
    extrude(amount=BOSS_EXTRUDE7_DEPTH)

    # Sketch27 → Cut-Extrude9 (cut)
    with BuildSketch(Plane.XY.offset(1.5)):
        with Locations((20.5, -11)):
            Circle(SKETCH27_R)
    extrude(amount=-CUT_EXTRUDE9_DEPTH, mode=Mode.SUBTRACT)

    # Fillet1
    fillet1_edges = [part.edges().sort_by_distance(p)[0] for p in [
        (23, -13.5, 0),
        (23, -8.5, 0),
    ]]
    fillet(fillet1_edges, radius=FILLET1_R - 0.0001)  # a hair under: the kernel refuses the full size

    # Fillet2
    fillet2_edges = [part.edges().sort_by_distance(p)[0] for p in [
        (18, -8.5, 0),
        (18, -13.5, 0),
    ]]
    fillet(fillet2_edges, radius=FILLET2_R)


solid = part.part
